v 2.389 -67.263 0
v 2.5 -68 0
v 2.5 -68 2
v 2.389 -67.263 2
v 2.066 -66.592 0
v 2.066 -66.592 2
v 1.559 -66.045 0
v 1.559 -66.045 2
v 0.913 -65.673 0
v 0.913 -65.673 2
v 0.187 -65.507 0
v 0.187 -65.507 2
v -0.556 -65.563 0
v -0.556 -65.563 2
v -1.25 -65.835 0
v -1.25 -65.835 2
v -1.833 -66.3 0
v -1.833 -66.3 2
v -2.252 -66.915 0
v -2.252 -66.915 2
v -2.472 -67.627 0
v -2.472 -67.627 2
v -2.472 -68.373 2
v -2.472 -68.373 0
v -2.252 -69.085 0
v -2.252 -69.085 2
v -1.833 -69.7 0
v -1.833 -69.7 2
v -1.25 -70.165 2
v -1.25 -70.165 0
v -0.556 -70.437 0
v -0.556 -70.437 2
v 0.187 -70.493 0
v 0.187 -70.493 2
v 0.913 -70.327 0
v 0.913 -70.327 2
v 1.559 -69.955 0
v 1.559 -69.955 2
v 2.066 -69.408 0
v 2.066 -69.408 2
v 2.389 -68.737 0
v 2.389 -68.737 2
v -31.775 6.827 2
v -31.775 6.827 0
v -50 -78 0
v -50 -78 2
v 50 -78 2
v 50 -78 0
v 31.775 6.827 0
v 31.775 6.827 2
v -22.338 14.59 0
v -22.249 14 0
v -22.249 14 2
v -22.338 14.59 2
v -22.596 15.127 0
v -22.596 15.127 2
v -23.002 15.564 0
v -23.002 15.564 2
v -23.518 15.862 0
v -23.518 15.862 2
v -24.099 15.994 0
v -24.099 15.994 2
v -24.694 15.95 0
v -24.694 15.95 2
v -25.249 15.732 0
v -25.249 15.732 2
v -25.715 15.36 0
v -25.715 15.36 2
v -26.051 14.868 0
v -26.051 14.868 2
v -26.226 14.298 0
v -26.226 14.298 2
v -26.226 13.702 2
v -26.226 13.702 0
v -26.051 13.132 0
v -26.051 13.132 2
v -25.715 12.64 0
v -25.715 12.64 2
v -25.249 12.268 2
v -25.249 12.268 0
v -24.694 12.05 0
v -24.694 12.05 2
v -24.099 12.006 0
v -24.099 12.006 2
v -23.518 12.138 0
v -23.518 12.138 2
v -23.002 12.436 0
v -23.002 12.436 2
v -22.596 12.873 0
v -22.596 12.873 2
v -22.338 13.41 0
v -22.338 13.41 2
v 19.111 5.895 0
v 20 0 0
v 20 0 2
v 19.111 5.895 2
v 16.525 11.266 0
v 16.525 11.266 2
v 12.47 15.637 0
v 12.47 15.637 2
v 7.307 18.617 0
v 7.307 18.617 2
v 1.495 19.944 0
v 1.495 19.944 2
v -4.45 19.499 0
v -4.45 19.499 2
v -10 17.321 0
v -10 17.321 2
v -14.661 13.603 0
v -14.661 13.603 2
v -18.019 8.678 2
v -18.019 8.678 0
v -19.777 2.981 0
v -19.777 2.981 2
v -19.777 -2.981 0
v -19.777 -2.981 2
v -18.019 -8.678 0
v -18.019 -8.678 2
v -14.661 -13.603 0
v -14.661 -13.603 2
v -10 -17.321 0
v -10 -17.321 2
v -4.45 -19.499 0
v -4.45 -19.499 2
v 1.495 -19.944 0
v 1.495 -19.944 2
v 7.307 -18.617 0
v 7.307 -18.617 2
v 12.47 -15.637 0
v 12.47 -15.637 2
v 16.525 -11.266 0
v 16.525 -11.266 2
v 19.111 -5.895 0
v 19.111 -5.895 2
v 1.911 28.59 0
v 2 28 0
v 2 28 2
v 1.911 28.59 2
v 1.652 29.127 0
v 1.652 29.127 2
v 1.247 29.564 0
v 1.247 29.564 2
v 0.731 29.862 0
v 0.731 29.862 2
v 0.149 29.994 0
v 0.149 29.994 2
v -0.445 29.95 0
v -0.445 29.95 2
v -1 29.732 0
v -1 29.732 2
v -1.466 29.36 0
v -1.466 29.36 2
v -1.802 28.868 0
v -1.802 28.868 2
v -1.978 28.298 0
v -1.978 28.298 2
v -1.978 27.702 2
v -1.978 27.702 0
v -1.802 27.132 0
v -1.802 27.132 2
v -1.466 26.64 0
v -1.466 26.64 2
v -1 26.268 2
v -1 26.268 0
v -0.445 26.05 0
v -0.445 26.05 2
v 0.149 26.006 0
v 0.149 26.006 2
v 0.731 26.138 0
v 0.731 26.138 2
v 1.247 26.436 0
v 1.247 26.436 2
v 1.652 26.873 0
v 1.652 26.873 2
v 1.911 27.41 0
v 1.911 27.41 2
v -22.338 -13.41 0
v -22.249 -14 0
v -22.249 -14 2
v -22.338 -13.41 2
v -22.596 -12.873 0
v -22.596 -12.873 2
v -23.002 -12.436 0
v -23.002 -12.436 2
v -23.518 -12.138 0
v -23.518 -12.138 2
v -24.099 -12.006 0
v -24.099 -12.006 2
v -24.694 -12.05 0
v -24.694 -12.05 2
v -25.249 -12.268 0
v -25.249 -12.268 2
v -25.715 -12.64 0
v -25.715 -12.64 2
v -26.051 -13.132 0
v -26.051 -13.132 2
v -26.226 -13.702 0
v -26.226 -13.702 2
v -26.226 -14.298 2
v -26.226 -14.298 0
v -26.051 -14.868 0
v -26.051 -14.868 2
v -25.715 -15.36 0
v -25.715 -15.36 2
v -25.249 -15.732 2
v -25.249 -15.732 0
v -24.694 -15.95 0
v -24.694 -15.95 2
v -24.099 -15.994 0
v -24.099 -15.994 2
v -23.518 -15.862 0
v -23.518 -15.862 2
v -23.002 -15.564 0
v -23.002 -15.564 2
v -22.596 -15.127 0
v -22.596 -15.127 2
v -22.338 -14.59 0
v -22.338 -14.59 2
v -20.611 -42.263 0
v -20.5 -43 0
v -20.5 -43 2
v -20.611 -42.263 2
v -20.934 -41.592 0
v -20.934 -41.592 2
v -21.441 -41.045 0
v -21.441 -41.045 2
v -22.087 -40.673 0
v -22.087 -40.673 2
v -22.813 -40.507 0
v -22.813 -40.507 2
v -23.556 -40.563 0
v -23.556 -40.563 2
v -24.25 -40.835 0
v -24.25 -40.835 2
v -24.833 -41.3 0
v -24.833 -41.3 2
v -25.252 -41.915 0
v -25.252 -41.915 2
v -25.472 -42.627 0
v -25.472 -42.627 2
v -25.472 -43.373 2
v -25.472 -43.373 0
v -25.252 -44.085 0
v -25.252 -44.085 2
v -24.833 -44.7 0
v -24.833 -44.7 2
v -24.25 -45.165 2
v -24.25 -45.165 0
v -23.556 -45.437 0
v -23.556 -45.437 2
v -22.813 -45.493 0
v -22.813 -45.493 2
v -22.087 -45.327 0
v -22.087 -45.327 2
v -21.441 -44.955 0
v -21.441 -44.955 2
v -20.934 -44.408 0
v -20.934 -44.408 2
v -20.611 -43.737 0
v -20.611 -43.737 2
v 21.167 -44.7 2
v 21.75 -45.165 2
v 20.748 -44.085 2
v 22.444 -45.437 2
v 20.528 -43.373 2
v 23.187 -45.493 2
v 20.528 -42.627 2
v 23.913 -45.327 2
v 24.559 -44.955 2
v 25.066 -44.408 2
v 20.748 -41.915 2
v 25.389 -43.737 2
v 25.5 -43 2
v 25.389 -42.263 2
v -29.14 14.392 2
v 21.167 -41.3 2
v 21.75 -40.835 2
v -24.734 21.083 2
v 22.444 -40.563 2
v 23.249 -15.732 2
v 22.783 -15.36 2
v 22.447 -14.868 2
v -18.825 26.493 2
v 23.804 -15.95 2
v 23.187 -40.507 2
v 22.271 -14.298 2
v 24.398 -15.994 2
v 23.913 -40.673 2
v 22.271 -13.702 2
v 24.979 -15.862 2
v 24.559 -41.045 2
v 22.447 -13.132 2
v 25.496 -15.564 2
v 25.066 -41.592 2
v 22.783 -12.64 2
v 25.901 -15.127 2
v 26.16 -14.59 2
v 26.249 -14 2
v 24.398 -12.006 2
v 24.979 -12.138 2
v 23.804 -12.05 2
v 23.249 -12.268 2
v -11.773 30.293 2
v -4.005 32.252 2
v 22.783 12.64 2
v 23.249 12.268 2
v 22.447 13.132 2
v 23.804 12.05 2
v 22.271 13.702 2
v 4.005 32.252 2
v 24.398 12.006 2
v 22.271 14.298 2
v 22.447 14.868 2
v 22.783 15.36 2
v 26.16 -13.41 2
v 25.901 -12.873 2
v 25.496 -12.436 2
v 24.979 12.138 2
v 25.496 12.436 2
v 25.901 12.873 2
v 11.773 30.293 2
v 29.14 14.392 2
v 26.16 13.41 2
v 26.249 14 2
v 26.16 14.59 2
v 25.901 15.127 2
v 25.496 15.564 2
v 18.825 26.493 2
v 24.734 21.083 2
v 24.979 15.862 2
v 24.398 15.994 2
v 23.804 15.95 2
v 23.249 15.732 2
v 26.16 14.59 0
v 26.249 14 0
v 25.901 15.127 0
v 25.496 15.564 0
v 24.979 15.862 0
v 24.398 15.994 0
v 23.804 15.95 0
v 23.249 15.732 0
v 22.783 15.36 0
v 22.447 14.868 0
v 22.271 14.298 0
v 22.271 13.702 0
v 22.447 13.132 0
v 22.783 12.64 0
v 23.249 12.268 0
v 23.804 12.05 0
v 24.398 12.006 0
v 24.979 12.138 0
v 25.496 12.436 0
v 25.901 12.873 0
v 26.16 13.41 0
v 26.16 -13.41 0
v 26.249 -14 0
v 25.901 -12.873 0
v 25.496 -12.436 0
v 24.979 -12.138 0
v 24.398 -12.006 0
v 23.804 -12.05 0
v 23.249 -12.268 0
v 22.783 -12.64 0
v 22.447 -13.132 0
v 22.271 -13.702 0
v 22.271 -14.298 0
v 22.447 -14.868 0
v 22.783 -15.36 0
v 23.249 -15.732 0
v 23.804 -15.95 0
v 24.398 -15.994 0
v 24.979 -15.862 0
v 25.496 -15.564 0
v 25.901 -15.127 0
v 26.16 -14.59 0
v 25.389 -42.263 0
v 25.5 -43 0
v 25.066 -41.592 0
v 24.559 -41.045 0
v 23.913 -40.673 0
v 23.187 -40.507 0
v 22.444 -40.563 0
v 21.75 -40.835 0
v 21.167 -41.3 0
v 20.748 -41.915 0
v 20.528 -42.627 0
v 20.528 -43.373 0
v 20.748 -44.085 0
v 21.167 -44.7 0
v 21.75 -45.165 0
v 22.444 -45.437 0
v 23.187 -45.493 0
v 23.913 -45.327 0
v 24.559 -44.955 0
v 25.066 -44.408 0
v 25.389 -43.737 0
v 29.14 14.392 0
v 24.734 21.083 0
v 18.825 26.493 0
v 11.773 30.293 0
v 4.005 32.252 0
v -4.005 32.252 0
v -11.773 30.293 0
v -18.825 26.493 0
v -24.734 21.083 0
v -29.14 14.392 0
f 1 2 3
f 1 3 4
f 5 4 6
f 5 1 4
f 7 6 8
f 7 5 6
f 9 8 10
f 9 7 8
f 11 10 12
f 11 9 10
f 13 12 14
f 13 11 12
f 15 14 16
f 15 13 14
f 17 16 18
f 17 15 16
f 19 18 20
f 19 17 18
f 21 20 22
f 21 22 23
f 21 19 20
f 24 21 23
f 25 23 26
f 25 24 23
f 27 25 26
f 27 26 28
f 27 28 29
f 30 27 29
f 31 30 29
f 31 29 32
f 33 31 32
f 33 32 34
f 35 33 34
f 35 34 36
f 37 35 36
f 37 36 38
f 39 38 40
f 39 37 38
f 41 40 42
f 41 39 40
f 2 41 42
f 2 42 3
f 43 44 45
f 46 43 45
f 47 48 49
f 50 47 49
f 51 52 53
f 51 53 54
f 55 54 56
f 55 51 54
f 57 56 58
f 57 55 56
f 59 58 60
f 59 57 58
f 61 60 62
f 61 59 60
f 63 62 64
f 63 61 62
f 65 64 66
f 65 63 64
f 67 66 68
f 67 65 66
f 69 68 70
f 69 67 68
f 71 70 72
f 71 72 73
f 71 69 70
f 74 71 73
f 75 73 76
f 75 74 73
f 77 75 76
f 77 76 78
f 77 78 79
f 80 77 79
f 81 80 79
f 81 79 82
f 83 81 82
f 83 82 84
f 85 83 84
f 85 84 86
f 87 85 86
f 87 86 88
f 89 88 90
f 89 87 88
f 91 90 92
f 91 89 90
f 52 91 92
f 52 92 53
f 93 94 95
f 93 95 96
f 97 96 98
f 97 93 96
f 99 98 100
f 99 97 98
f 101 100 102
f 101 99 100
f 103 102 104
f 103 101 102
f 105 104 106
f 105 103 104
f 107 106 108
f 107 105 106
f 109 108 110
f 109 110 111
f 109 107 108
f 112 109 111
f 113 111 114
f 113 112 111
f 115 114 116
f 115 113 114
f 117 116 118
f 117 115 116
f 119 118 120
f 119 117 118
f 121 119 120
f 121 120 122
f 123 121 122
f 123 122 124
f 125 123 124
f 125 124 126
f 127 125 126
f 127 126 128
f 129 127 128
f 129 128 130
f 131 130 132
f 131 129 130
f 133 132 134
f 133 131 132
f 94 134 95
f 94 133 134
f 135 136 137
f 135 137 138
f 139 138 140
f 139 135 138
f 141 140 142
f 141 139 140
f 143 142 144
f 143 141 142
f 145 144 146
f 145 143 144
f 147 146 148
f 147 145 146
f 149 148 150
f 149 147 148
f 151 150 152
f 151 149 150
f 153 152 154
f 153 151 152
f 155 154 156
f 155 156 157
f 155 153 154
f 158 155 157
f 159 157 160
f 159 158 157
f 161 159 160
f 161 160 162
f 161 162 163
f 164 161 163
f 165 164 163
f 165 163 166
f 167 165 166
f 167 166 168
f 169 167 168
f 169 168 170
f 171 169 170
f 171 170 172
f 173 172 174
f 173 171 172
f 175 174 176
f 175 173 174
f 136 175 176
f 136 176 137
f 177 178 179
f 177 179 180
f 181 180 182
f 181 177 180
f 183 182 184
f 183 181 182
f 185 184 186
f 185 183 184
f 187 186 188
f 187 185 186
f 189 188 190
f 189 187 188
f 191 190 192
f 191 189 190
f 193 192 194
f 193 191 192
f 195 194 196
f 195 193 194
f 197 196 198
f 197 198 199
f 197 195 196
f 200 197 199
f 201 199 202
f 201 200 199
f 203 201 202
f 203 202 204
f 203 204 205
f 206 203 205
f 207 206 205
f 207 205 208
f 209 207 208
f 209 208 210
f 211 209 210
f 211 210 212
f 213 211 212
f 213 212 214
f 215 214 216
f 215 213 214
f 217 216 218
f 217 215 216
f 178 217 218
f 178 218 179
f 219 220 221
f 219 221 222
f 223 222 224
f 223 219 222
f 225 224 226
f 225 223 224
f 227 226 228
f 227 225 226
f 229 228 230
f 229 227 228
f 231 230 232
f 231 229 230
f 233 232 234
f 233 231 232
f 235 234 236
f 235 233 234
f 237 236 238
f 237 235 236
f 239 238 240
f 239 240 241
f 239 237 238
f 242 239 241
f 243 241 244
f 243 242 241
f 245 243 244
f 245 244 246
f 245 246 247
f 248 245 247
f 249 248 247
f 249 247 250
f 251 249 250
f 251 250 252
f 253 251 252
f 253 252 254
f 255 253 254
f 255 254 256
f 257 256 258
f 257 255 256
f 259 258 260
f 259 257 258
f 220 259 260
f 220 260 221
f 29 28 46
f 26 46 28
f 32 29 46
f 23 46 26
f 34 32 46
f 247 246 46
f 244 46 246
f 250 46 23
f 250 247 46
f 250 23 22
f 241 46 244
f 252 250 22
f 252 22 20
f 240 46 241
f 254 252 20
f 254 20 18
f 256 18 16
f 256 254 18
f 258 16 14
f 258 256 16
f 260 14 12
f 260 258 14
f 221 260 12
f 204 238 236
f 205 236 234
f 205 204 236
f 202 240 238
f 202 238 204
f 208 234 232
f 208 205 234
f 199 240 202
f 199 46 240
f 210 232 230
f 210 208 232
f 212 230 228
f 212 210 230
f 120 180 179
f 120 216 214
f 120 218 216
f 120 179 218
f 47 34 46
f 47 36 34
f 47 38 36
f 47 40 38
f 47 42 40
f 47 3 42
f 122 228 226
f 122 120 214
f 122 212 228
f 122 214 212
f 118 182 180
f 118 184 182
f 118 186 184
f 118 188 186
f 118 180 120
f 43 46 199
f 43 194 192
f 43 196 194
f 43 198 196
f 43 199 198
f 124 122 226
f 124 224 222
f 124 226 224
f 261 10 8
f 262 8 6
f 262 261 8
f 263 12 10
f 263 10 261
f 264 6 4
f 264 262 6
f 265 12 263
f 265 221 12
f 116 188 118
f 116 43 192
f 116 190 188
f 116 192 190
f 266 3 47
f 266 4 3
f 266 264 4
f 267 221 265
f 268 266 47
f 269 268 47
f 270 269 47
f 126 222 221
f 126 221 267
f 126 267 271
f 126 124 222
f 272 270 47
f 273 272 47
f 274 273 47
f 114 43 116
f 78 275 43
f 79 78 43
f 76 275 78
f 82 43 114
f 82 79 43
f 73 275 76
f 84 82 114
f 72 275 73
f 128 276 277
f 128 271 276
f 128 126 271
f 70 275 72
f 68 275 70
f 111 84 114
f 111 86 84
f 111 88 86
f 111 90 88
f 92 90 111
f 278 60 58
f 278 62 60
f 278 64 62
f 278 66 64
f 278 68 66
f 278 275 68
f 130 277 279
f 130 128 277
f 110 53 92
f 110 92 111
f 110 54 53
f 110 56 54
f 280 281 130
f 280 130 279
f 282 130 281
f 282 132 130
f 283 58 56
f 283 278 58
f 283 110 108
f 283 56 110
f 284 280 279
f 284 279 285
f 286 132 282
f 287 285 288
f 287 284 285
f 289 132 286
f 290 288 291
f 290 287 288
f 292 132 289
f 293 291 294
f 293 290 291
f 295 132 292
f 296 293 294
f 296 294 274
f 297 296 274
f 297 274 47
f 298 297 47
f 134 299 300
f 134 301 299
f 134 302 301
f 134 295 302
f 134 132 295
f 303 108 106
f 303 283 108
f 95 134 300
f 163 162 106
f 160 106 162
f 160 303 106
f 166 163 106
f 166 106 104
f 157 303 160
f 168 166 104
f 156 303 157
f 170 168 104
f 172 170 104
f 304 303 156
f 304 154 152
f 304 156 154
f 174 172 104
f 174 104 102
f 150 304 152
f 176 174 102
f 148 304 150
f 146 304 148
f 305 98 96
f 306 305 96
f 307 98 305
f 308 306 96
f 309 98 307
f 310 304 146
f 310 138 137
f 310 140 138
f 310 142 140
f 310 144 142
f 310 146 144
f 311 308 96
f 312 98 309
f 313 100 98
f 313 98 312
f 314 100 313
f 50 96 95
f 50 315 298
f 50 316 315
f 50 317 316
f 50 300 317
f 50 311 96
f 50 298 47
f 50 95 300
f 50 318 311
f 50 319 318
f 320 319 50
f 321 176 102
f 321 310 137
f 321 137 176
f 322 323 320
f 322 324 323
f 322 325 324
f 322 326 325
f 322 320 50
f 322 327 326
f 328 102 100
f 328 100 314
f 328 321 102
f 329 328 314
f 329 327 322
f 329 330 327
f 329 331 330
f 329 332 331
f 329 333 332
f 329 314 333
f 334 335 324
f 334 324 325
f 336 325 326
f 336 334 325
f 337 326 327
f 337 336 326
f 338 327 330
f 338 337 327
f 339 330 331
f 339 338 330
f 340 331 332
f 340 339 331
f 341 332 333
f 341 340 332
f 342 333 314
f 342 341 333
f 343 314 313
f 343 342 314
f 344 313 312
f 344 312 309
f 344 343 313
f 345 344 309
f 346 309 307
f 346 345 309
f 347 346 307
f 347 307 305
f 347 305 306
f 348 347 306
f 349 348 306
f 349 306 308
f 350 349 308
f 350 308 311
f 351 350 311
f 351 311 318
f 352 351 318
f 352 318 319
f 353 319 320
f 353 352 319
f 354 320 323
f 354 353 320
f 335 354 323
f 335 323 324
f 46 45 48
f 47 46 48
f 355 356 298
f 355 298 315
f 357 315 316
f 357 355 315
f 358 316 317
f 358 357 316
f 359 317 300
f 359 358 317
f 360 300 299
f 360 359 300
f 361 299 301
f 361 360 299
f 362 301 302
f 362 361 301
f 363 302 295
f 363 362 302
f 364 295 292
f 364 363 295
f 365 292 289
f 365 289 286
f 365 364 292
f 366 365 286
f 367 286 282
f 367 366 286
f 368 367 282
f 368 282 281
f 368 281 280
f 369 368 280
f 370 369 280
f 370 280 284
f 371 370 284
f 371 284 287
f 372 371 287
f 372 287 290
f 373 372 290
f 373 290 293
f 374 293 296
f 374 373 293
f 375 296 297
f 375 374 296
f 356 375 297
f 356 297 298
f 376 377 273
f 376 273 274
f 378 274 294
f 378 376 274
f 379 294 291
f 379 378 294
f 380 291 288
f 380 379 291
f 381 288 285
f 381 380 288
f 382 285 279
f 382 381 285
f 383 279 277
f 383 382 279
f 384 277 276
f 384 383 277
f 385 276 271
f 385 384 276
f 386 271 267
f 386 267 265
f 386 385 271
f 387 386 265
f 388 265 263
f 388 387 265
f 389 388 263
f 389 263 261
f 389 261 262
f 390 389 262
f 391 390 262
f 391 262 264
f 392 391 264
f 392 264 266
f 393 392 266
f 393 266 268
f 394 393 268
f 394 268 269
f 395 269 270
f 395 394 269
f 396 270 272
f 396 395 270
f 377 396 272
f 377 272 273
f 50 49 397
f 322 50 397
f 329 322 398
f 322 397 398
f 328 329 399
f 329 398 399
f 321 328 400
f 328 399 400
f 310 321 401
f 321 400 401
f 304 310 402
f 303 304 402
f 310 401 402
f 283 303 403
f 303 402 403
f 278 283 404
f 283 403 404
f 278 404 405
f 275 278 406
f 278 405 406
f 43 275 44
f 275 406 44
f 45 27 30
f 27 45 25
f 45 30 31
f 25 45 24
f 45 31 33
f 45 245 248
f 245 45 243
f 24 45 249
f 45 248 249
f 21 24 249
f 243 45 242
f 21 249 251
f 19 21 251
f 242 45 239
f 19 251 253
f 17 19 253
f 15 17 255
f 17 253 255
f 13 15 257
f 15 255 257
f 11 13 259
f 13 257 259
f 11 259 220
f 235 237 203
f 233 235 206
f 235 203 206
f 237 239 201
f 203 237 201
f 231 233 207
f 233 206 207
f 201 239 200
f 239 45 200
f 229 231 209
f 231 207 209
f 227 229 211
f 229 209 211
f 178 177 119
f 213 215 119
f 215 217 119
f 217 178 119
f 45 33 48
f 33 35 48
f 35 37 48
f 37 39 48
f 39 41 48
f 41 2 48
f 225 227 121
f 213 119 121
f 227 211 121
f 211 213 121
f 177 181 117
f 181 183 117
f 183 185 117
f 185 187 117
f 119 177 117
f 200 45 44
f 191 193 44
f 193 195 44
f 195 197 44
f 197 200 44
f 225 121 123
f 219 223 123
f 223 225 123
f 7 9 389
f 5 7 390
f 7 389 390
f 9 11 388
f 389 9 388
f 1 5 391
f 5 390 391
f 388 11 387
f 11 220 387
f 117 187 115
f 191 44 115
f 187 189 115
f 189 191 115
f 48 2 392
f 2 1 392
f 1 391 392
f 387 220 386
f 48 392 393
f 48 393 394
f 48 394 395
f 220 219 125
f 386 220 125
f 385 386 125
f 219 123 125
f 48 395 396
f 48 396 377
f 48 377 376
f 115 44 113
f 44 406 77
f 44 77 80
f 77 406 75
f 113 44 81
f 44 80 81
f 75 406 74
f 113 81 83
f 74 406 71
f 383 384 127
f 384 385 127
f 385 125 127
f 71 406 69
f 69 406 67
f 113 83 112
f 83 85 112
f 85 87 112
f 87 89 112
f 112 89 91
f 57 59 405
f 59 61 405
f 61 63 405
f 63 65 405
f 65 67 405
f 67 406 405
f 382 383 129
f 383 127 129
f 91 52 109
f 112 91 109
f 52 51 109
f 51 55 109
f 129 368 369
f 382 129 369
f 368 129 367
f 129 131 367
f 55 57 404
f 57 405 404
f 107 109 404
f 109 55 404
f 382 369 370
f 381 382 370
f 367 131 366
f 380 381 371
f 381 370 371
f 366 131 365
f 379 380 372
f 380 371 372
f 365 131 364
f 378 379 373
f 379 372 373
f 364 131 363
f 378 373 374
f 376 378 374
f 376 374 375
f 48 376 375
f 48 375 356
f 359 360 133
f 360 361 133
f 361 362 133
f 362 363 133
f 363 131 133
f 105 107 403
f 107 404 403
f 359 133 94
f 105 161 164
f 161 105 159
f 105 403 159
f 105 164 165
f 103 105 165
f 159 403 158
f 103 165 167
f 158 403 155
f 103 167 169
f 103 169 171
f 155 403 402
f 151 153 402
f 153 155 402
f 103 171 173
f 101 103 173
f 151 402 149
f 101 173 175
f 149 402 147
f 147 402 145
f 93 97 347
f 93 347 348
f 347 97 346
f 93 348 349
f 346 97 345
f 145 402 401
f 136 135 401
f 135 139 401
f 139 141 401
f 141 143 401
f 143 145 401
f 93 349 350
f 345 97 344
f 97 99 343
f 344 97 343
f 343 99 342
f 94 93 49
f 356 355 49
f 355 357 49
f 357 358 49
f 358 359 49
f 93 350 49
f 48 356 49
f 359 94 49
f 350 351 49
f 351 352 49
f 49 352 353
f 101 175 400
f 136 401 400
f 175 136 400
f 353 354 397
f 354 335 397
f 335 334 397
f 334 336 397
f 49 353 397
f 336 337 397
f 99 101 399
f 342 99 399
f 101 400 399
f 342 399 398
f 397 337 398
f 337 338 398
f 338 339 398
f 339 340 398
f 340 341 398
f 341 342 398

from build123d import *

# Parameters (mm, degrees)
SKETCH1_R           = 20
SKETCH1_R_2         = 2
SKETCH1_R_3         = 2.5
BOSS_EXTRUDE1_DEPTH = 2


with BuildPart() as part:
    # Sketch1 → Boss-Extrude1 (new body)
    with BuildSketch(Plane.XY):
        with BuildLine():
            Line((-50, -78), (50, -78))
            Line((50, -78), (31.774896218, 6.82685655))
            ThreePointArc((31.774896218, 6.82685655), (0, 32.5), (-31.774896218, 6.82685655))
            Line((-31.774896218, 6.82685655), (-50, -78))
        make_face()
        Circle(SKETCH1_R, mode=Mode.SUBTRACT)
        with Locations((0, 28)):
            Circle(SKETCH1_R_2, mode=Mode.SUBTRACT)
        with Locations((24.248711306, 14)):
            Circle(SKETCH1_R_2, mode=Mode.SUBTRACT)
        with Locations((24.248711306, -14)):
            Circle(SKETCH1_R_2, mode=Mode.SUBTRACT)
        with Locations((-24.248711306, -14)):
            Circle(SKETCH1_R_2, mode=Mode.SUBTRACT)
        with Locations((-24.248711306, 14)):
            Circle(SKETCH1_R_2, mode=Mode.SUBTRACT)
        with Locations((0, -68)):
            Circle(SKETCH1_R_3, mode=Mode.SUBTRACT)
        with Locations((23, -43)):
            Circle(SKETCH1_R_3, mode=Mode.SUBTRACT)
        with Locations((-23, -43)):
            Circle(SKETCH1_R_3, mode=Mode.SUBTRACT)
    extrude(amount=BOSS_EXTRUDE1_DEPTH)


solid = part.part
